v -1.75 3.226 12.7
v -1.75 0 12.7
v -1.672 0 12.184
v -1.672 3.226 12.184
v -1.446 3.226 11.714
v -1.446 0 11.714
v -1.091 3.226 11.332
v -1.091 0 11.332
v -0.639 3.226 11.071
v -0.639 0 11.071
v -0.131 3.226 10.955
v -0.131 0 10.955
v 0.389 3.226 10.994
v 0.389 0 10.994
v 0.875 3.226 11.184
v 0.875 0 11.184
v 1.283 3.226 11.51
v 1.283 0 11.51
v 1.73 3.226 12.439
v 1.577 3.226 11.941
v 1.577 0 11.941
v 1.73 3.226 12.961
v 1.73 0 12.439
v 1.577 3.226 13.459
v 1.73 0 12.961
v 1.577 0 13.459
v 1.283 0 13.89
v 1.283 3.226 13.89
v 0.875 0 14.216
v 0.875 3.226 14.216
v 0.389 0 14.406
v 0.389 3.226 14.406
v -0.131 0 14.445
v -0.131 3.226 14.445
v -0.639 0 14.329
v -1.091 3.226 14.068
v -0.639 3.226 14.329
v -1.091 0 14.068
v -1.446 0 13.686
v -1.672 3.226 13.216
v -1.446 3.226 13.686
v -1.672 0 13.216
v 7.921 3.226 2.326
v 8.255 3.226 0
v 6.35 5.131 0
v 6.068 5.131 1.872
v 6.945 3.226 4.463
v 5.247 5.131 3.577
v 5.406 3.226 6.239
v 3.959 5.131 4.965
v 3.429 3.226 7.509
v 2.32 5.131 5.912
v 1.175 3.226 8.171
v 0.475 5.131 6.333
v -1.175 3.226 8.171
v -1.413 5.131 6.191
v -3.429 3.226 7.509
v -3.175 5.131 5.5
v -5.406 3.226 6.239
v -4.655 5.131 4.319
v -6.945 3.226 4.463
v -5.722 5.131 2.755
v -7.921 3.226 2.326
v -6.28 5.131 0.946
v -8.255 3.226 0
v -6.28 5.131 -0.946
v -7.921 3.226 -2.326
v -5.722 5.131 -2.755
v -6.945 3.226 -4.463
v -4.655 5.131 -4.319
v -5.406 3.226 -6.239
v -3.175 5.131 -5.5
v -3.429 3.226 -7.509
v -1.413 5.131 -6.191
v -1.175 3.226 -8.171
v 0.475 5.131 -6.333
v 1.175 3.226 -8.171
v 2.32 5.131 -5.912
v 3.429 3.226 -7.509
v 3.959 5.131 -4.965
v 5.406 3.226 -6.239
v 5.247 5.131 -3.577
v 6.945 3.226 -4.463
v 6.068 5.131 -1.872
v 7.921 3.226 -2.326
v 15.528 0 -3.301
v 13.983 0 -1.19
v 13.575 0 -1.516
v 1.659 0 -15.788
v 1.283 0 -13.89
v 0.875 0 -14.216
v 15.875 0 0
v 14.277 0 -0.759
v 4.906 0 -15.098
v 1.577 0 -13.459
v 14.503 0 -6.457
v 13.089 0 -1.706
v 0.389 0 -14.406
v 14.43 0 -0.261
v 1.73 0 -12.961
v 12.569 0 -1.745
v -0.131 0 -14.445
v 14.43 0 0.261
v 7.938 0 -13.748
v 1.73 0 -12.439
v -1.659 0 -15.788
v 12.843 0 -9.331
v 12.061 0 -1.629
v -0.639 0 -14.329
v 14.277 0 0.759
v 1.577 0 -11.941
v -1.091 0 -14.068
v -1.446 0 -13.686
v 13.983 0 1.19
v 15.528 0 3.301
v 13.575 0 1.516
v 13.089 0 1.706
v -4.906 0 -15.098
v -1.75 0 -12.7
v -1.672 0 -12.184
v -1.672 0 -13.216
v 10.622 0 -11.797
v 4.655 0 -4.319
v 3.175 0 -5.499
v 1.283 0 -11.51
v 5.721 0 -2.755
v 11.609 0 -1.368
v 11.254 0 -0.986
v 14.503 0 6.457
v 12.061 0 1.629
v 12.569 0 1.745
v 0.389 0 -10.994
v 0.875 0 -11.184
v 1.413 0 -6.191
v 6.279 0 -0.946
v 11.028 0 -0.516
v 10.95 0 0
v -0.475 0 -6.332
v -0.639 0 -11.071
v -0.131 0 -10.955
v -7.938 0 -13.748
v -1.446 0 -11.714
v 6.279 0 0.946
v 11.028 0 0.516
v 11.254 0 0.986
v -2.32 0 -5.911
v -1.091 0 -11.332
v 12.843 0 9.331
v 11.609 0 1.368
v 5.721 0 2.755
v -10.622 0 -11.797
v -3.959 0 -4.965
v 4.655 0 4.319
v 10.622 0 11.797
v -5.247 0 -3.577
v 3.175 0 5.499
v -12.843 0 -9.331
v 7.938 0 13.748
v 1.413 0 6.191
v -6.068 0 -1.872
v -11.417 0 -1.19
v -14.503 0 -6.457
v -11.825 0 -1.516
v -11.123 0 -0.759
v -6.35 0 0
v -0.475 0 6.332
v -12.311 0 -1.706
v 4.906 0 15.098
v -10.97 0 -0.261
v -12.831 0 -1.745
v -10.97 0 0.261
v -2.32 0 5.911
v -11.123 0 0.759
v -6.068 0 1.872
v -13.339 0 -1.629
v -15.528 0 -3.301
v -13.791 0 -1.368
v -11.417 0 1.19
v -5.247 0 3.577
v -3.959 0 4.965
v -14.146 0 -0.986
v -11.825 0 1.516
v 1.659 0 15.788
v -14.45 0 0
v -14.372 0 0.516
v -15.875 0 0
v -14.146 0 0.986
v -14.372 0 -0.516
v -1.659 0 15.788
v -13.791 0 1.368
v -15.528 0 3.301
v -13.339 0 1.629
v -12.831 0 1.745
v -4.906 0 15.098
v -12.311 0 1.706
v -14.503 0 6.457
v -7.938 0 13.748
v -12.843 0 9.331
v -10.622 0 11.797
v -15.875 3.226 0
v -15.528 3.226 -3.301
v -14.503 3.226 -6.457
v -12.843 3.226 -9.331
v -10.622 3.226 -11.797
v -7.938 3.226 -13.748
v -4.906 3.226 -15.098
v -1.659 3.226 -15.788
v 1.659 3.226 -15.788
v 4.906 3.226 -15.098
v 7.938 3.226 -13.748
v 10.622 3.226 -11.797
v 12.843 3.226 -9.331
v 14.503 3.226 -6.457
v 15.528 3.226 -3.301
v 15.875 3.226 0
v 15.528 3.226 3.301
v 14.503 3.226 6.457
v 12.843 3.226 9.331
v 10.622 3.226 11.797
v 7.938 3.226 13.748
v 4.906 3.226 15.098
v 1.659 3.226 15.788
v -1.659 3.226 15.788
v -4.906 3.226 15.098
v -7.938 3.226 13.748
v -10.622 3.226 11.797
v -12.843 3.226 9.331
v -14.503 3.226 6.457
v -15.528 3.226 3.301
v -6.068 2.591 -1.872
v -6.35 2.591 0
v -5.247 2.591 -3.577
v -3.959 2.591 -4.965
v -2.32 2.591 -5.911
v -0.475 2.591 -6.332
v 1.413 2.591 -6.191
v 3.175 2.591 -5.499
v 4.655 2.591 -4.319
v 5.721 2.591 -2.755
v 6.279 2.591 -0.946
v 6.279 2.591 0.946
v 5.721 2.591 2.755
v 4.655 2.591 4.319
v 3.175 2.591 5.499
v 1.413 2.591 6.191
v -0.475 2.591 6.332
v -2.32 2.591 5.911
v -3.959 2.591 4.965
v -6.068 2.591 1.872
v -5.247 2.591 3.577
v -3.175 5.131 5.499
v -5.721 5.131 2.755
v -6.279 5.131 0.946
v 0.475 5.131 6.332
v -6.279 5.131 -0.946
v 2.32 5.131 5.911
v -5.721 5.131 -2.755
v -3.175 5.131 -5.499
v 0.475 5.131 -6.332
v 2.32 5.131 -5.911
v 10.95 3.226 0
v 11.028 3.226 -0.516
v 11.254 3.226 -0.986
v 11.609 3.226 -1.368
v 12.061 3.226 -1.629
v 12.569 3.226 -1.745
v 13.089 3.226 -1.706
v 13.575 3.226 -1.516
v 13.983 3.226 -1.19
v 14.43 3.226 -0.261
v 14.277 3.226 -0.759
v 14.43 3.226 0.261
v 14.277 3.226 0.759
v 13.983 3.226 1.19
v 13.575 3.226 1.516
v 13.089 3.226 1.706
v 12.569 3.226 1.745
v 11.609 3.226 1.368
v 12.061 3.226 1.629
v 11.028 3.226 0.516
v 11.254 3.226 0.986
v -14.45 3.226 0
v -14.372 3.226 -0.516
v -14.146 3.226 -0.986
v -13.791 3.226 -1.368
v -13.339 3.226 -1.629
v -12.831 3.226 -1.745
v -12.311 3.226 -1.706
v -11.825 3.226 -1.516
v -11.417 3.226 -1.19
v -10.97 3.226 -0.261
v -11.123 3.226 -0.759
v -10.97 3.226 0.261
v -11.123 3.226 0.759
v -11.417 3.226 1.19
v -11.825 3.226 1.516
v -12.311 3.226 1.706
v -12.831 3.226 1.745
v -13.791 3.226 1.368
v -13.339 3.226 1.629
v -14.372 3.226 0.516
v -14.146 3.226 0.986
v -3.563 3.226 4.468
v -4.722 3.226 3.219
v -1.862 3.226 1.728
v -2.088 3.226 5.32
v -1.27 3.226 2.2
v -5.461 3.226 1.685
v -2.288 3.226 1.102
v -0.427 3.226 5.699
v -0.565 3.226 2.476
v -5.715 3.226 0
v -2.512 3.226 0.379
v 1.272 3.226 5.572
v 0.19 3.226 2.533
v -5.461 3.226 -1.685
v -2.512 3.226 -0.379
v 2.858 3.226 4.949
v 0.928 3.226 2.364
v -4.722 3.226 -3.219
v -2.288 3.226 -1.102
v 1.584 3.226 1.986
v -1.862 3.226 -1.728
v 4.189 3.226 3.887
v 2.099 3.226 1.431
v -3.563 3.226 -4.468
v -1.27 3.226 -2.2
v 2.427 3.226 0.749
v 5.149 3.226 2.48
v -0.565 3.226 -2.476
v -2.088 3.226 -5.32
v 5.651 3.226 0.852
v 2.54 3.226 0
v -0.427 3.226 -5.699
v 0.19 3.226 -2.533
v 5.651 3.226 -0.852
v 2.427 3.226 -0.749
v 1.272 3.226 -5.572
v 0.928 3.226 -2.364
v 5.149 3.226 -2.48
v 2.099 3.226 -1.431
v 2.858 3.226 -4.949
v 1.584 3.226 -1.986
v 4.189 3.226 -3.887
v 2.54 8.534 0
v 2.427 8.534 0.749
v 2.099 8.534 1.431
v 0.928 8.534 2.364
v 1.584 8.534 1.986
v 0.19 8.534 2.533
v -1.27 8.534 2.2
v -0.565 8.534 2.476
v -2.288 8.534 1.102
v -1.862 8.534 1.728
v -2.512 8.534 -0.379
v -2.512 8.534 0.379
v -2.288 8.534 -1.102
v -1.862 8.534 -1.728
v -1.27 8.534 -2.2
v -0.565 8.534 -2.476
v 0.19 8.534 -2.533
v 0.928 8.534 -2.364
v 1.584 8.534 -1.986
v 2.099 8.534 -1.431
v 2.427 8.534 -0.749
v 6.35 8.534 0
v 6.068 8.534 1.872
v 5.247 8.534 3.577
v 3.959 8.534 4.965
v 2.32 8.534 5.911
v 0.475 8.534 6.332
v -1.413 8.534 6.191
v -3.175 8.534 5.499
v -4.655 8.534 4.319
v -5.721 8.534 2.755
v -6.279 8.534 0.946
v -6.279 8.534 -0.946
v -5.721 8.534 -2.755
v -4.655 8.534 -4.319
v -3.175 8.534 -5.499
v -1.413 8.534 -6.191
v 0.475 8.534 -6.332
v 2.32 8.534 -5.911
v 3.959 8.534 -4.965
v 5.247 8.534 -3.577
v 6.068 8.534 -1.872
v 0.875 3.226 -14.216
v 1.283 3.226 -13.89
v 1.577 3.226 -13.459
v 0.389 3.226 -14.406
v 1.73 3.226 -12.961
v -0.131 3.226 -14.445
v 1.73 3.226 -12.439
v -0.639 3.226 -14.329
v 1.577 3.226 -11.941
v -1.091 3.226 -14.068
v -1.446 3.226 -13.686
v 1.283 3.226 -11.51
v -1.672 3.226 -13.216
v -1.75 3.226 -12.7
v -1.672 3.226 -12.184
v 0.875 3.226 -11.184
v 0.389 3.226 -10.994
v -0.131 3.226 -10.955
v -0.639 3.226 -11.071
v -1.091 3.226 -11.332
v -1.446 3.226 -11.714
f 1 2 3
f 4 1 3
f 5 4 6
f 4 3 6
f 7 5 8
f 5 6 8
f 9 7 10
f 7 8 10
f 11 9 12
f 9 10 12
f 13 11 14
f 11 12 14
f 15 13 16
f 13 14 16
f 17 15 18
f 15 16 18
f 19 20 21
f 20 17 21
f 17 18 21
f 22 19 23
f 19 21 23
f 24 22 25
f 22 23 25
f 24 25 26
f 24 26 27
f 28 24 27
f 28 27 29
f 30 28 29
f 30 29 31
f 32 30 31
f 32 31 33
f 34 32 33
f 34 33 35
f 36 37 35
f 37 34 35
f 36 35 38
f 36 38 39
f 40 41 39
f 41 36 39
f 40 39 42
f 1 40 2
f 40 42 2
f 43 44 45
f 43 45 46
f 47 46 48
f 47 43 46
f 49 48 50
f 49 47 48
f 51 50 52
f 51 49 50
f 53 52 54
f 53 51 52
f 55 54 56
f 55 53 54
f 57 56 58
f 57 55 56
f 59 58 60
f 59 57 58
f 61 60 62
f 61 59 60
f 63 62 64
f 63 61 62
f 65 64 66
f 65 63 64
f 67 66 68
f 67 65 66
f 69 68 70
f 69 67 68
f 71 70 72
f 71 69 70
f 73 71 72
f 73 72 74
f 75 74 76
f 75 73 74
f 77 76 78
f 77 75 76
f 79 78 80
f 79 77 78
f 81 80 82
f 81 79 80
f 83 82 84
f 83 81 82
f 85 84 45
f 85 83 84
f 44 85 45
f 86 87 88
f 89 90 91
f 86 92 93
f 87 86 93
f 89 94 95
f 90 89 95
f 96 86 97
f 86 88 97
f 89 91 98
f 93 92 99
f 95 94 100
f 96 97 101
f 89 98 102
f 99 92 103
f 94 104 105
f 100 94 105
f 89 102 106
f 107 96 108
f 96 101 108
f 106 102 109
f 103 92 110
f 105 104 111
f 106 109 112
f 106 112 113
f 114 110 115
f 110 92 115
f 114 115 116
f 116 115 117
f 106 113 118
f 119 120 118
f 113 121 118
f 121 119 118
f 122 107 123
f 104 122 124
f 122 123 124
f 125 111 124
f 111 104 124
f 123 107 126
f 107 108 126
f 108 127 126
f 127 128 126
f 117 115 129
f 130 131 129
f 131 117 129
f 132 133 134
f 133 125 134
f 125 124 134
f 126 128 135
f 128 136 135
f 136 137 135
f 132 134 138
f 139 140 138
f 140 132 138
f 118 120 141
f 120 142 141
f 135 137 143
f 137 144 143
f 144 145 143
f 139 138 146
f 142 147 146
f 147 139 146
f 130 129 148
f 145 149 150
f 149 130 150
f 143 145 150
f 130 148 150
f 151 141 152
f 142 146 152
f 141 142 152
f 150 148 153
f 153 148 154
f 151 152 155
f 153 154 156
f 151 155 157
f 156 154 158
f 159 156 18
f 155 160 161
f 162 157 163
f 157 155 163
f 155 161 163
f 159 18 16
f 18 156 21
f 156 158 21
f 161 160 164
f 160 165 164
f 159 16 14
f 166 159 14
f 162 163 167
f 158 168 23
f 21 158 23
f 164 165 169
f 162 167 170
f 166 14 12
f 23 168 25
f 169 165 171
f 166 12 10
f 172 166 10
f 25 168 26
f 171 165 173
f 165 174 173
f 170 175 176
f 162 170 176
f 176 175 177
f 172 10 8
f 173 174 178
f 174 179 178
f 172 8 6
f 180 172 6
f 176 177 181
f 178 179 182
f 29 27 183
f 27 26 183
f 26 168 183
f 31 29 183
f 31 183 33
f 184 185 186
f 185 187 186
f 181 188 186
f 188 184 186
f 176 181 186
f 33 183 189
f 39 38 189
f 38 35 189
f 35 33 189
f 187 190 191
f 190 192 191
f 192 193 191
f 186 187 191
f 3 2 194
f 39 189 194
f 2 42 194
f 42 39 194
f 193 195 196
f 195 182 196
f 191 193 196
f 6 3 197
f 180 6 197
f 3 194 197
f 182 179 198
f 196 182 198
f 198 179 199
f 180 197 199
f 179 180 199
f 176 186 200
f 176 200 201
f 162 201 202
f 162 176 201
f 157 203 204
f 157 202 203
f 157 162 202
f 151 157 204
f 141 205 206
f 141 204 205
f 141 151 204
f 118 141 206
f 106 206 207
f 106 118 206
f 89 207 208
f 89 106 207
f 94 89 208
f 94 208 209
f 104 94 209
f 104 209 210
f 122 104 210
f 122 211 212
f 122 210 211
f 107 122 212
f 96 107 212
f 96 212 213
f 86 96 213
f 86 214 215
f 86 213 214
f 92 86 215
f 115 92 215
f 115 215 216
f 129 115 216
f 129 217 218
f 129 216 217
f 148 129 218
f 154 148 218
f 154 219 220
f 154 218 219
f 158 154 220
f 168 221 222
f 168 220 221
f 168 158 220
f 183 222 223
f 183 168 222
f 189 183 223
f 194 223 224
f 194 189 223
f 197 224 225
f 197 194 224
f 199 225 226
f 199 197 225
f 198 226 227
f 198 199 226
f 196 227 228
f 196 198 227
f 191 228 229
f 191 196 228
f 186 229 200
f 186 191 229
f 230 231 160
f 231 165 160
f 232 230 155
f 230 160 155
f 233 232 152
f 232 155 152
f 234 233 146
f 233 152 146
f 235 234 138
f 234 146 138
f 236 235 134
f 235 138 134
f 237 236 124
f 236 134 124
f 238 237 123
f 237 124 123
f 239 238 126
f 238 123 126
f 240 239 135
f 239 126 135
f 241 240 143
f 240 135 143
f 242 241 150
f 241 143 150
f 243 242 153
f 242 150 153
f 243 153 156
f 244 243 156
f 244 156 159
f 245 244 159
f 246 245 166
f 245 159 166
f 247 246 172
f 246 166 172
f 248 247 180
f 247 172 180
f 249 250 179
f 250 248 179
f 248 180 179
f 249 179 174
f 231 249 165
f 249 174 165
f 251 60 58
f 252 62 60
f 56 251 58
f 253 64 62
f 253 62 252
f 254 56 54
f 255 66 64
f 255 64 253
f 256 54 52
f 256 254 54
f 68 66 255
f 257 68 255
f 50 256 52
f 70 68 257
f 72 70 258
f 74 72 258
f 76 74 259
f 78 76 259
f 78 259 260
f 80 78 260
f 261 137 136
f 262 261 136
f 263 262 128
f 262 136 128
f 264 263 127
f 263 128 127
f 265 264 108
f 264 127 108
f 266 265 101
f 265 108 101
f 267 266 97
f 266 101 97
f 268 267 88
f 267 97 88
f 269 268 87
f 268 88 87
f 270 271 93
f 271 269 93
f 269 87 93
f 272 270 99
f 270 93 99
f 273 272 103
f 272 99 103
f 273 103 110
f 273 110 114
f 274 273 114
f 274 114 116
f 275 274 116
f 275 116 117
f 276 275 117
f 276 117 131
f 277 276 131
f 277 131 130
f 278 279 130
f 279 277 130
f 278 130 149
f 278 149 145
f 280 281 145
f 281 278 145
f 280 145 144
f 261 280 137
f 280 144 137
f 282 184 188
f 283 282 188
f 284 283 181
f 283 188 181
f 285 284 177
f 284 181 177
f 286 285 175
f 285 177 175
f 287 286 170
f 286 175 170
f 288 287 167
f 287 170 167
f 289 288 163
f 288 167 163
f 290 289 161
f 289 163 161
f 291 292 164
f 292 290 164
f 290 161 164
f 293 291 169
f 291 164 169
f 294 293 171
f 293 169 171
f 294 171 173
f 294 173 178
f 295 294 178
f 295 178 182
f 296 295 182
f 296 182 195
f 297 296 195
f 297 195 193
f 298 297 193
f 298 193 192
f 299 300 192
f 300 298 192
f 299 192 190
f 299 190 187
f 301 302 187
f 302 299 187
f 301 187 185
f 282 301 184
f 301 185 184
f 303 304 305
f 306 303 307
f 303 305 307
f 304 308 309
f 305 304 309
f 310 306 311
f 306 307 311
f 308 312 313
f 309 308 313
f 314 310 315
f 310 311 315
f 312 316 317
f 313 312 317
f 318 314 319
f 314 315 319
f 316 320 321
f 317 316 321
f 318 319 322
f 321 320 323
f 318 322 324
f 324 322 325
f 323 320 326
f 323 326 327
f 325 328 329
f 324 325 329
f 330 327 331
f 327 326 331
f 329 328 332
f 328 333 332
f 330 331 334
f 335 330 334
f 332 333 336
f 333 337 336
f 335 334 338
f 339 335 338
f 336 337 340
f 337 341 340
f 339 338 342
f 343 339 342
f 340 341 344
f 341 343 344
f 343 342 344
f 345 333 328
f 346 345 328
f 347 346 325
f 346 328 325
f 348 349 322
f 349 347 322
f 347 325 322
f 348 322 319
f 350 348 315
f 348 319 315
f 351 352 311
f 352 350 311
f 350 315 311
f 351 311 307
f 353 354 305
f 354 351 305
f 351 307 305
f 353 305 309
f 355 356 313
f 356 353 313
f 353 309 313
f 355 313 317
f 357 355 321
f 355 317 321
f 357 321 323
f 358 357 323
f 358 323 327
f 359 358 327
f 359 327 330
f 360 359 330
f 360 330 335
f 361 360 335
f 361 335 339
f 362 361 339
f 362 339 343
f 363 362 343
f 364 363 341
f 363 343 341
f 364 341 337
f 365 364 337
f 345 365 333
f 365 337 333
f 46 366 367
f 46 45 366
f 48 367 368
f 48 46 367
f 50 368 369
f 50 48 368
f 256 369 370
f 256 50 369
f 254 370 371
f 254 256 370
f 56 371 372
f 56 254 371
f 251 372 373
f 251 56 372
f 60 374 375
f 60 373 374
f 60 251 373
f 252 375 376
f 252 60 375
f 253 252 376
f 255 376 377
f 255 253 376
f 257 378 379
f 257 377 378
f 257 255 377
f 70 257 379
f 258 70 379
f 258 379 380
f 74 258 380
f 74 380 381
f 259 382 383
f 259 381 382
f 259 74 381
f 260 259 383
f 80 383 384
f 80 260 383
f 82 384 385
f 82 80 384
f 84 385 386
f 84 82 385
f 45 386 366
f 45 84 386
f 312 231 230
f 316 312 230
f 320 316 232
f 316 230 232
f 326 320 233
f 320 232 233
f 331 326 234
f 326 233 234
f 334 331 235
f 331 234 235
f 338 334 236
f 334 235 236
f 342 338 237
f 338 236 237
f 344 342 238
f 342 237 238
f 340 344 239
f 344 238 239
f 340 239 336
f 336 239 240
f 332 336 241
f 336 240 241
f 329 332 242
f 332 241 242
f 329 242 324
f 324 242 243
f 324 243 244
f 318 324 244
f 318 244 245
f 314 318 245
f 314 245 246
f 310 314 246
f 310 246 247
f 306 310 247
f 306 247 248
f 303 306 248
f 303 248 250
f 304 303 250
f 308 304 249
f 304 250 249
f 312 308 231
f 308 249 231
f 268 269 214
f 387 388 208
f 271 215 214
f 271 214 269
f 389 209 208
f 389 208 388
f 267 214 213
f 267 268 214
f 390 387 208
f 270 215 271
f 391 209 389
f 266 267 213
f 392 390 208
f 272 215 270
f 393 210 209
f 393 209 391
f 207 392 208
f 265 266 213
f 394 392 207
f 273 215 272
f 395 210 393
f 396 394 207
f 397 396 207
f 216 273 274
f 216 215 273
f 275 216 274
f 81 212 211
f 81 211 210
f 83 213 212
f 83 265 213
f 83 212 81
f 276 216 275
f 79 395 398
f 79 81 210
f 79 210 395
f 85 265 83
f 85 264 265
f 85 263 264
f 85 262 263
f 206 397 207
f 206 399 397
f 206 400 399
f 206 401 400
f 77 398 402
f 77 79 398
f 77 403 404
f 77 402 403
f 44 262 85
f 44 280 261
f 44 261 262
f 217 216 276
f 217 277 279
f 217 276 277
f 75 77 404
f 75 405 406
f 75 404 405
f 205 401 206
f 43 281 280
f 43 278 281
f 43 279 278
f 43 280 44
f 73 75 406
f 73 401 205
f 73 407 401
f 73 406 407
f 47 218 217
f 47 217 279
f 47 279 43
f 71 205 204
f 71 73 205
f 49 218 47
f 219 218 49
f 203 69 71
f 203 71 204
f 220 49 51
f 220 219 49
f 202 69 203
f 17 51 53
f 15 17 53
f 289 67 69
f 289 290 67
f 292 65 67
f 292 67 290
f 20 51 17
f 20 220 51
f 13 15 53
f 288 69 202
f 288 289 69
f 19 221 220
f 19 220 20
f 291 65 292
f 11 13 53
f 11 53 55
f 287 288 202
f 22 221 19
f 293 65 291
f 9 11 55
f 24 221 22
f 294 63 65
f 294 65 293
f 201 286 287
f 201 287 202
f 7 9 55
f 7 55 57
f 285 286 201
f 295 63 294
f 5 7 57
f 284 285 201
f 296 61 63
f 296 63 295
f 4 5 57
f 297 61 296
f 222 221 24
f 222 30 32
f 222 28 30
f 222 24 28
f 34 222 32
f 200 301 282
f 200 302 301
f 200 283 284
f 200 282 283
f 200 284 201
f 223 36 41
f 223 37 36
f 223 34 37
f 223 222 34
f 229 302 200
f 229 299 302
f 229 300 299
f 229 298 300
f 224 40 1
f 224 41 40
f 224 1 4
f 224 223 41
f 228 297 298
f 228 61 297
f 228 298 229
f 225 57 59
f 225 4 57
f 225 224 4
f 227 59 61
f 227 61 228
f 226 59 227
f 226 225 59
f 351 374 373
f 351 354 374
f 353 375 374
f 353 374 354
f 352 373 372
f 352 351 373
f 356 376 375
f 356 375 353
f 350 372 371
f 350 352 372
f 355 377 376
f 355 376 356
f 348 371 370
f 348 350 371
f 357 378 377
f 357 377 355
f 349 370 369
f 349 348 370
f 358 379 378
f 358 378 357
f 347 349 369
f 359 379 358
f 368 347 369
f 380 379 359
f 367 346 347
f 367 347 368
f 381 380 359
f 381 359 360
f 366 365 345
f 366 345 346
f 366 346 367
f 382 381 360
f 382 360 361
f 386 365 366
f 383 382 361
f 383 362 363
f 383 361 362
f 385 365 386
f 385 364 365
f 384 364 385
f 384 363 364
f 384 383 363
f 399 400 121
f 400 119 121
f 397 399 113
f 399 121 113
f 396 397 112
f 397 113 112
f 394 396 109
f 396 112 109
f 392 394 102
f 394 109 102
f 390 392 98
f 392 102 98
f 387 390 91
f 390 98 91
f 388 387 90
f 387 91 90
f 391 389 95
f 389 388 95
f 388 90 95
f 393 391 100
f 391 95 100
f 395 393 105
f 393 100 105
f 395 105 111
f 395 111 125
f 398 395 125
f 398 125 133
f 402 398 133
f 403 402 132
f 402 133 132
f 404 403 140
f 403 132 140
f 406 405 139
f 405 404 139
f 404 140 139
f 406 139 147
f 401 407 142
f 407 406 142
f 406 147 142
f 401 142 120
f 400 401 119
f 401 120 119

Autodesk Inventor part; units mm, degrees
ref_plane "YZ Plane" through (0, 0, 0) normal (1, 0, 0) x (0, 1, 0)
ref_plane "XZ Plane" through (0, 0, 0) normal (0, 1, 0) x (-1, 0, 0)
sketch "Sketch1" plane through (0, 0, 0) normal (0, 1, 0) x (-1, 0, 0)
  circle A0 centre (0, 0) radius 15.875
  circle A1 centre (0, 0) radius 6.35
  circle A2 centre (0, 12.7) radius 1.75
  circle A3 centre (-12.7, 0) radius 1.75
  circle A4 centre (0, -12.7) radius 1.75
  circle A5 centre (12.7, 0) radius 1.75
  dimension "d1" = 12.7
  dimension "d6" = 3.5
  dimension "d7" = 3.5
  dimension "d8" = 3.5
  dimension "d9" = 3.5
extrude "Extrusion1" add sketch "Sketch1" along normal blind 3.2258
sketch "Sketch2" plane through (0, 3.2258, 0) normal (0, 1, 0) x (1, 0, 0)
  circle A0 centre (0, 0) radius 6.35
  circle A1 centre (0, 0) radius 2.54
  dimension "d12" = 5.08
extrude "Extrusion2" add sketch "Sketch2" along normal blind 5.3086
sketch "Sketch3" plane through (0, 8.5344, 0) normal (0, 1, 0) x (1, 0, 0)
  line L0 (0, 0) -> (6.35, 0)
  circle A0 centre (0, 0) radius 6.35 projected
  line L1 (0, 0) -> (-6.35, 0)
ref_plane "Work Plane3" through (0, 8.5344, 0) normal (1, 0, 0) x (0, 1, 0)
sketch "Sketch5" plane through (0, 3.2258, 0) normal (0, 1, 0) x (1, 0, 0)
  circle A0 centre (0, 0) radius 6.35
  circle A1 centre (0, 0) radius 8.255
  dimension "d17" = 16.51
extrude "Extrusion3" add sketch "Sketch5" along normal blind 1.905
chamfer "Chamfer1" distance 1.905 angle 45 1 edges at (-8.255, 5.1308, 0)
chamfer "Chamfer2" distance 0.635 angle 45 1 edges at (6.35, 3.2258, 0)
properties part number "FlywheelMount"
